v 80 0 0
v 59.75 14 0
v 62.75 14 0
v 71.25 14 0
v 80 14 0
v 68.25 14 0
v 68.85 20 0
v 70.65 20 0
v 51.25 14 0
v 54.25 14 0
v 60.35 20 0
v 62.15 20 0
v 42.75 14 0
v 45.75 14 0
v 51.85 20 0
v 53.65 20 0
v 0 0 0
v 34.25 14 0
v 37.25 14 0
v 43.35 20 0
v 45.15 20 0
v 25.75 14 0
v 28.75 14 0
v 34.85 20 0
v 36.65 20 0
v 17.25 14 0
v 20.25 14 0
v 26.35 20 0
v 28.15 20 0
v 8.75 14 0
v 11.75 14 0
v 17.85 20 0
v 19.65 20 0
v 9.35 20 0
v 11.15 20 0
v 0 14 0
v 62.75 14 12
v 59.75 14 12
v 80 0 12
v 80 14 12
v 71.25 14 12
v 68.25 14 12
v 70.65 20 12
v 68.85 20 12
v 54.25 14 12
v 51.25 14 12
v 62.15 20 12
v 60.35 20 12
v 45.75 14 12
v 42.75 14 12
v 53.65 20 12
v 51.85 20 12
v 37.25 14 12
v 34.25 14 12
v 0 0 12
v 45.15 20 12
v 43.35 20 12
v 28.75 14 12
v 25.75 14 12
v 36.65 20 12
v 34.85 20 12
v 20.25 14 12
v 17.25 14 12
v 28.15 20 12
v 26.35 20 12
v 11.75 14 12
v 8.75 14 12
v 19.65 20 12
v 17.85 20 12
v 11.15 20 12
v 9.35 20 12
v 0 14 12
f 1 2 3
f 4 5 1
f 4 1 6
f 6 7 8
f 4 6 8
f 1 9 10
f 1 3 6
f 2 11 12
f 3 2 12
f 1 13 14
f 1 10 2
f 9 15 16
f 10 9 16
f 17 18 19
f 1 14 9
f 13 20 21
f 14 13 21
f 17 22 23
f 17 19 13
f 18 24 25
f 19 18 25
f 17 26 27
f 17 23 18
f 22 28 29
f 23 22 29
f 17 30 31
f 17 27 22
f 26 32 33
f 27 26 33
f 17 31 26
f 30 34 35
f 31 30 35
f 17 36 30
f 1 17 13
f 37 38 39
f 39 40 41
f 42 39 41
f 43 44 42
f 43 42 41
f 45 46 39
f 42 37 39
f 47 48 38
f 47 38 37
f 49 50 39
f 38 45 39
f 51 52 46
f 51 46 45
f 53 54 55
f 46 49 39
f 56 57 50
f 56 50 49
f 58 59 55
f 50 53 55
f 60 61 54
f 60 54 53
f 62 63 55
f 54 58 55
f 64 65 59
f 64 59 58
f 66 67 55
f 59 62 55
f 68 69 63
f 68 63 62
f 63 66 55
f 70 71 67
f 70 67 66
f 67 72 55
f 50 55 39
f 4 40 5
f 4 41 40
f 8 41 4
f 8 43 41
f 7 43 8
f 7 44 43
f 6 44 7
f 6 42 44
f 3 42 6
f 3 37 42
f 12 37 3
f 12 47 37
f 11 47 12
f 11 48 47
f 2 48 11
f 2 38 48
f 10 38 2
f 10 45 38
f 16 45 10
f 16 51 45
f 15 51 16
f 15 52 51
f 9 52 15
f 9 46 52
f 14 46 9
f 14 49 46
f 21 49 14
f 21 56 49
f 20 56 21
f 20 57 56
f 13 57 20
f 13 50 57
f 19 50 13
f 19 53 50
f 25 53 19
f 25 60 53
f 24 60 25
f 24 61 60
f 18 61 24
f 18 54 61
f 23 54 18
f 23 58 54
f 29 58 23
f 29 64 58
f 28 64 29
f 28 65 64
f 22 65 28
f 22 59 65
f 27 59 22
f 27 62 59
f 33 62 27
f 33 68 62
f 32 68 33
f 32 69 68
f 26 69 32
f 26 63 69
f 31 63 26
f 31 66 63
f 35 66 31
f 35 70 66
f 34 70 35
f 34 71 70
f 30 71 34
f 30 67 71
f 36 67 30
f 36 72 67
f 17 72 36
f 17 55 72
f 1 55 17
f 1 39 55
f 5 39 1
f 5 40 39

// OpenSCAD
$fn = 32;

// ----------------------------------------------------------------------
// Gear rack: 8 teeth on a 80 mm bar, pitch 8.5 mm
// ----------------------------------------------------------------------

// --- parameters (mm) ---
profile_height = 12;      // extrusion height
profile_points = 36;      // points of the closed outline

profile = [[0, 0], [80, 0], [80, 14], [71.25, 14], [70.65, 20], [68.85, 20], [68.25, 14], [62.75, 14], [62.15, 20], [60.35, 20], [59.75, 14], [54.25, 14], [53.65, 20], [51.85, 20], [51.25, 14], [45.75, 14], [45.15, 20], [43.35, 20], [42.75, 14], [37.25, 14], [36.65, 20], [34.85, 20], [34.25, 14], [28.75, 14], [28.15, 20], [26.35, 20], [25.75, 14], [20.25, 14], [19.65, 20], [17.85, 20], [17.25, 14], [11.75, 14], [11.15, 20], [9.35, 20], [8.75, 14], [0, 14]];  // single closed polygon, 36 points, counter clockwise

// --- the one profile operation ---
linear_extrude(height = profile_height) polygon(points = profile);
